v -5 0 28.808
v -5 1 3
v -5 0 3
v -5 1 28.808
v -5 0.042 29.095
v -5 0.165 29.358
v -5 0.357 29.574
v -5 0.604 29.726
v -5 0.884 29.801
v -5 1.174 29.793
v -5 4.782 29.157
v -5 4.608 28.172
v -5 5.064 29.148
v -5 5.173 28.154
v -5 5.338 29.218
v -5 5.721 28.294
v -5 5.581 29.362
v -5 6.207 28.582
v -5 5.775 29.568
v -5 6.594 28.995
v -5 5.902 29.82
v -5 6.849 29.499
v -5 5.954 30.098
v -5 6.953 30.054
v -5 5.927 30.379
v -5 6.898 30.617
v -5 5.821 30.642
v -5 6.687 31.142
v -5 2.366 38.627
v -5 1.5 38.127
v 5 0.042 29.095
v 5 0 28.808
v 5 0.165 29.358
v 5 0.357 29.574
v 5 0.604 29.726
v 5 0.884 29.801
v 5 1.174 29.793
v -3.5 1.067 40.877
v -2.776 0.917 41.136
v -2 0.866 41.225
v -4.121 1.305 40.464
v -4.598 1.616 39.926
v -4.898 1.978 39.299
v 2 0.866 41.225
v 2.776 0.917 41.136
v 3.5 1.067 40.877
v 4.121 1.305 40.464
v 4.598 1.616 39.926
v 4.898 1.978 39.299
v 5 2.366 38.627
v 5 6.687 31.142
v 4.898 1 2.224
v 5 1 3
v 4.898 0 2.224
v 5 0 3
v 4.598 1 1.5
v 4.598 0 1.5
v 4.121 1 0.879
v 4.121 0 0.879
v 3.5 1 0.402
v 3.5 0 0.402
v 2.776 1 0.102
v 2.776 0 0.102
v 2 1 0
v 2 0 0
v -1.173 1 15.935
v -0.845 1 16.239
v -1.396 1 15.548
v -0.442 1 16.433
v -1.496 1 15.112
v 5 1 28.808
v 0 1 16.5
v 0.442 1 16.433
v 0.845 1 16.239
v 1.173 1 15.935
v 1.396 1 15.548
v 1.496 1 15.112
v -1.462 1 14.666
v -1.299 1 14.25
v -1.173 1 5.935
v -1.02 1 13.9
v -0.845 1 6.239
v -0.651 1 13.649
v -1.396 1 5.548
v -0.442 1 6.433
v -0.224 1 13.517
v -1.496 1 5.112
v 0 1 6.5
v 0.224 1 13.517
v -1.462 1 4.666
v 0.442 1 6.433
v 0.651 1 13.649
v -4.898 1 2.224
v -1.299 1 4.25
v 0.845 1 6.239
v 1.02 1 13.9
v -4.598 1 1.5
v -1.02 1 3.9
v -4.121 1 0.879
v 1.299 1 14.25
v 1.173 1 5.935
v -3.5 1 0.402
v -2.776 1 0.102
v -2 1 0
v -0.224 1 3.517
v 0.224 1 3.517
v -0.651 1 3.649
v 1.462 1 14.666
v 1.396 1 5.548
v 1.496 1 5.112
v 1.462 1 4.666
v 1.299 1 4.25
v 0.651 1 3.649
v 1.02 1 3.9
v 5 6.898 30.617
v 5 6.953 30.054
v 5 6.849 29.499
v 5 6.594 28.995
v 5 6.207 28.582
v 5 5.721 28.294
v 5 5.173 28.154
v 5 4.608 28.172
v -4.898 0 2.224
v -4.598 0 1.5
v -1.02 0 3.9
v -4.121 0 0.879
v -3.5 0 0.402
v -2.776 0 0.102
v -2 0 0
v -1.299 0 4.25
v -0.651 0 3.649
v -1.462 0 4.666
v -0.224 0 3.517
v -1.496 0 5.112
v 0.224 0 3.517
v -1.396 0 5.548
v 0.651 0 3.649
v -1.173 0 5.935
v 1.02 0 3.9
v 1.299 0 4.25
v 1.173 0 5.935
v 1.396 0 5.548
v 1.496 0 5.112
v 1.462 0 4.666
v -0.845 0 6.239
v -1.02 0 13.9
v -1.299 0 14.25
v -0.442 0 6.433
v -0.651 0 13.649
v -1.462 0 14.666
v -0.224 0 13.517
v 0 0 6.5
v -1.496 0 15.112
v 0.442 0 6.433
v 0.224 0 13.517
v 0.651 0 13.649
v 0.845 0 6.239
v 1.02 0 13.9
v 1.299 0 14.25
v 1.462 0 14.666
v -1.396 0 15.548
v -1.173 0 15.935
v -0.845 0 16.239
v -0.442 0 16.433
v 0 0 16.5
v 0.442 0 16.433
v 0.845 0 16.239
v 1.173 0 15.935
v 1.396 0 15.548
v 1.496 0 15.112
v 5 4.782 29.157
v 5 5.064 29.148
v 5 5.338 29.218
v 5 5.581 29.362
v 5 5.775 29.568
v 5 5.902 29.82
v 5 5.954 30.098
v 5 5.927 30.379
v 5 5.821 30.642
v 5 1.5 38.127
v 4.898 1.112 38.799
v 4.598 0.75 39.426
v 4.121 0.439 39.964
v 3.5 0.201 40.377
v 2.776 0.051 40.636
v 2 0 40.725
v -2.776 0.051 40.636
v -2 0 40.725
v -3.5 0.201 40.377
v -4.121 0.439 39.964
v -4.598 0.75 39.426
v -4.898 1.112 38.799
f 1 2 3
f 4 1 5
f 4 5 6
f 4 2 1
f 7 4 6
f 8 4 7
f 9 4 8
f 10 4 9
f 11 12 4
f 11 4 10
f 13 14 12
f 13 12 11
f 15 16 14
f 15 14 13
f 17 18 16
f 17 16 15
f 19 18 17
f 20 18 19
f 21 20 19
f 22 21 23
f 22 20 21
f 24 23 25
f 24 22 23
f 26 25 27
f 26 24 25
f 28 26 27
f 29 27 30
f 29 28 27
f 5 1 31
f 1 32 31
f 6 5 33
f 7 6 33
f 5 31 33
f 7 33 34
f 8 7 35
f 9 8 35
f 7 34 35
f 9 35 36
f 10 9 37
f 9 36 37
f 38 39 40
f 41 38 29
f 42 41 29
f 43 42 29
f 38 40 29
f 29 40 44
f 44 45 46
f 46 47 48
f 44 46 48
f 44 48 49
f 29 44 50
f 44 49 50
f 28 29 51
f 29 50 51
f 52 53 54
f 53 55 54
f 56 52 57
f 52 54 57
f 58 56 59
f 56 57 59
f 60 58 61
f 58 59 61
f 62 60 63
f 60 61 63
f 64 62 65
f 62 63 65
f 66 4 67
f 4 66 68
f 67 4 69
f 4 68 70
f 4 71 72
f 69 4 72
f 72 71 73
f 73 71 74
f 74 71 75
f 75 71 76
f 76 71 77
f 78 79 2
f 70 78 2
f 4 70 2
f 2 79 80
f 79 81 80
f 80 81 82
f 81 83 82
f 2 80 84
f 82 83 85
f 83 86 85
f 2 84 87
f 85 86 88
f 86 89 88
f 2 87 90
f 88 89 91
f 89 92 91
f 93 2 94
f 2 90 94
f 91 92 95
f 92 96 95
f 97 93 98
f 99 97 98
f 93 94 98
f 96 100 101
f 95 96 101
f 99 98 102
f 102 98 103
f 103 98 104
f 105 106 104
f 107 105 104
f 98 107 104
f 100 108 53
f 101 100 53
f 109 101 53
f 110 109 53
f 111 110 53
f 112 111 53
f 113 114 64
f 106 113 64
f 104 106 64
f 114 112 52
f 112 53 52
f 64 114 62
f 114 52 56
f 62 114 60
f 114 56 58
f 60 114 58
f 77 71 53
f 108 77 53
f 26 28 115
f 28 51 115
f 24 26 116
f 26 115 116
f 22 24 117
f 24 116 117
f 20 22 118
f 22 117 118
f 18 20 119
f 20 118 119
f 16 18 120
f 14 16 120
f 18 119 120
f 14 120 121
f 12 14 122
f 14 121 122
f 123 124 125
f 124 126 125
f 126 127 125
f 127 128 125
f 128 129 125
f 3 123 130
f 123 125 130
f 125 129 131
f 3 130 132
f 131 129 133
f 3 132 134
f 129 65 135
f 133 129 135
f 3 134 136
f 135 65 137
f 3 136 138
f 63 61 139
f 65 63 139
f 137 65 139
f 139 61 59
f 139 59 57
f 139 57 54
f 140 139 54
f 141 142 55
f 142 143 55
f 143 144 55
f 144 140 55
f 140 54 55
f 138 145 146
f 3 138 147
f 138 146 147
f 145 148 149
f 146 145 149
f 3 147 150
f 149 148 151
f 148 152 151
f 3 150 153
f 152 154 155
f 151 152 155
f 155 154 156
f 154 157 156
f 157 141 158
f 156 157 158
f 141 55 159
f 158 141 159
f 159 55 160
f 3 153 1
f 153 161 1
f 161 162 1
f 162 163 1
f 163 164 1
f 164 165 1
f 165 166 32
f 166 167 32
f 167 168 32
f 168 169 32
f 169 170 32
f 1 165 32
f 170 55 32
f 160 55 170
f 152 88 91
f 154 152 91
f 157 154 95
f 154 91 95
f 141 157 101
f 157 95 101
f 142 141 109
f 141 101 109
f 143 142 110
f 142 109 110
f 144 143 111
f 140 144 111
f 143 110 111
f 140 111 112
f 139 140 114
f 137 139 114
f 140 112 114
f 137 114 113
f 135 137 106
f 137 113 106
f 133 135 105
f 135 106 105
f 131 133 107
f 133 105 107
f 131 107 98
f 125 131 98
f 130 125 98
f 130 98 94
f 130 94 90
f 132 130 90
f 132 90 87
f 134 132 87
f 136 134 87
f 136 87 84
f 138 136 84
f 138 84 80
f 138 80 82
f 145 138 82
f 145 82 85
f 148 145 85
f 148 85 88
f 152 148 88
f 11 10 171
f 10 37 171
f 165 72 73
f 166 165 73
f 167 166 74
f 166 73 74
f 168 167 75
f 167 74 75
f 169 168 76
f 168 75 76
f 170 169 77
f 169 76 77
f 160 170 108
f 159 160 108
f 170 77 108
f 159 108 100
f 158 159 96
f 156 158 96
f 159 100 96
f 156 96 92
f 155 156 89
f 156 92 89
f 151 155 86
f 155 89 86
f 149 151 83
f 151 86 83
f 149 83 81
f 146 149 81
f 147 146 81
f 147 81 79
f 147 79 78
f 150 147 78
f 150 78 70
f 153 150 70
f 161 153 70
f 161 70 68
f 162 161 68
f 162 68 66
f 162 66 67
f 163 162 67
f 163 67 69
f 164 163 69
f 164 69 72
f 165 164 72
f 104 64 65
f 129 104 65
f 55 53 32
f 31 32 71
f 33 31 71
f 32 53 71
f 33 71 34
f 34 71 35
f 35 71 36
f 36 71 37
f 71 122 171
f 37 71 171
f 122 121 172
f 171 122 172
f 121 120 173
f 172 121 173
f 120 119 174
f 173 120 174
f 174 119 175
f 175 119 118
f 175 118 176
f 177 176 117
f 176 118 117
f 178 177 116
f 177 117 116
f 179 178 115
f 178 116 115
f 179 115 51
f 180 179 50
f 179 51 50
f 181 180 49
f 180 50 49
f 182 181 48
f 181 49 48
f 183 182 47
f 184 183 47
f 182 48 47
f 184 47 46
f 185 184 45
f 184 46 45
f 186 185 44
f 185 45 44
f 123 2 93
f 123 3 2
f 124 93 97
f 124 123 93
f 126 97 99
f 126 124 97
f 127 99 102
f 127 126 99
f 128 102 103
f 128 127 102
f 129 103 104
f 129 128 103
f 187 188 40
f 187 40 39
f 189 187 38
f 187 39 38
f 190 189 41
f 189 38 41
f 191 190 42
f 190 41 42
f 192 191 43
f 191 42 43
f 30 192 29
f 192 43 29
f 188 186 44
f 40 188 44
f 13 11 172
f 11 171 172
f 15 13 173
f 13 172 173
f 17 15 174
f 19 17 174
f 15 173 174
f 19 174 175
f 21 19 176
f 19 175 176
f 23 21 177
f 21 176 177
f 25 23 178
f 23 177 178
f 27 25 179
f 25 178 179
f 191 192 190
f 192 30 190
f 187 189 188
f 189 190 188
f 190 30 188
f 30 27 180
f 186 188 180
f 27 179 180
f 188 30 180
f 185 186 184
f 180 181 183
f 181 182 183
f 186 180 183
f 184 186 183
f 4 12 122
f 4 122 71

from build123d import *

# Parameters (mm, degrees)
EXTRUDE_THIN1_DEPTH = 5
FILLET1_R           = 3
SKETCH2_R           = 1.5
CUT_EXTRUDE1_DEPTH  = 10


with BuildPart() as part:
    # Sketch1 → Extrude-Thin1 (new, symmetric)
    with BuildSketch(Plane(origin=(0, 0, 0), x_dir=(0, 0, -1), z_dir=(1, 0, 0))):
        with BuildLine():
            Line((0, 0), (-28.808246407, 0))
            ThreePointArc((-28.808246407, 0), (-29.574290851, 0.35721239), (-29.79305416, 1.173648178))
            Line((-29.79305416, 1.173648178), (-29.156852475, 4.781727229))
            ThreePointArc((-29.156852475, 4.781727229), (-29.568083792, 5.774527451), (-30.641660228, 5.821400811))
            Line((-30.641660228, 5.821400811), (-40.724622204, 0))
            Line((-40.724622204, 0), (-41.224622204, 0.866025404))
            Line((-41.224622204, 0.866025404), (-31.141660228, 6.687426215))
            ThreePointArc((-31.141660228, 6.687426215), (-28.994507355, 6.593679496), (-28.172044722, 4.608079052))
            Line((-28.172044722, 4.608079052), (-28.808246407, 1))
            Line((-28.808246407, 1), (0, 1))
            Line((0, 1), (0, 0))
        make_face()
    extrude(amount=EXTRUDE_THIN1_DEPTH, both=True)

    # Fillet1
    fillet1_edges = [part.edges().sort_by_distance(p)[0] for p in [
        (-5, 0.433012702, 40.974622204),
        (5, 0.5, 0),
        (5, 0.433012702, 40.974622204),
        (-5, 0.5, 0),
    ]]
    fillet(fillet1_edges, radius=FILLET1_R)

    # Sketch2 → Cut-Extrude1 (cut)
    with BuildSketch(Plane(origin=(0, 1, 0), x_dir=(1, 0, 0), z_dir=(0, 1, 0))):
        with Locations(Location((0, -5, 0), (0, 0, 270))):
            Circle(SKETCH2_R)
        with Locations(Location((0, -15, 0), (0, 0, 270))):
            Circle(SKETCH2_R)
    extrude(amount=-CUT_EXTRUDE1_DEPTH, mode=Mode.SUBTRACT)


solid = part.part
